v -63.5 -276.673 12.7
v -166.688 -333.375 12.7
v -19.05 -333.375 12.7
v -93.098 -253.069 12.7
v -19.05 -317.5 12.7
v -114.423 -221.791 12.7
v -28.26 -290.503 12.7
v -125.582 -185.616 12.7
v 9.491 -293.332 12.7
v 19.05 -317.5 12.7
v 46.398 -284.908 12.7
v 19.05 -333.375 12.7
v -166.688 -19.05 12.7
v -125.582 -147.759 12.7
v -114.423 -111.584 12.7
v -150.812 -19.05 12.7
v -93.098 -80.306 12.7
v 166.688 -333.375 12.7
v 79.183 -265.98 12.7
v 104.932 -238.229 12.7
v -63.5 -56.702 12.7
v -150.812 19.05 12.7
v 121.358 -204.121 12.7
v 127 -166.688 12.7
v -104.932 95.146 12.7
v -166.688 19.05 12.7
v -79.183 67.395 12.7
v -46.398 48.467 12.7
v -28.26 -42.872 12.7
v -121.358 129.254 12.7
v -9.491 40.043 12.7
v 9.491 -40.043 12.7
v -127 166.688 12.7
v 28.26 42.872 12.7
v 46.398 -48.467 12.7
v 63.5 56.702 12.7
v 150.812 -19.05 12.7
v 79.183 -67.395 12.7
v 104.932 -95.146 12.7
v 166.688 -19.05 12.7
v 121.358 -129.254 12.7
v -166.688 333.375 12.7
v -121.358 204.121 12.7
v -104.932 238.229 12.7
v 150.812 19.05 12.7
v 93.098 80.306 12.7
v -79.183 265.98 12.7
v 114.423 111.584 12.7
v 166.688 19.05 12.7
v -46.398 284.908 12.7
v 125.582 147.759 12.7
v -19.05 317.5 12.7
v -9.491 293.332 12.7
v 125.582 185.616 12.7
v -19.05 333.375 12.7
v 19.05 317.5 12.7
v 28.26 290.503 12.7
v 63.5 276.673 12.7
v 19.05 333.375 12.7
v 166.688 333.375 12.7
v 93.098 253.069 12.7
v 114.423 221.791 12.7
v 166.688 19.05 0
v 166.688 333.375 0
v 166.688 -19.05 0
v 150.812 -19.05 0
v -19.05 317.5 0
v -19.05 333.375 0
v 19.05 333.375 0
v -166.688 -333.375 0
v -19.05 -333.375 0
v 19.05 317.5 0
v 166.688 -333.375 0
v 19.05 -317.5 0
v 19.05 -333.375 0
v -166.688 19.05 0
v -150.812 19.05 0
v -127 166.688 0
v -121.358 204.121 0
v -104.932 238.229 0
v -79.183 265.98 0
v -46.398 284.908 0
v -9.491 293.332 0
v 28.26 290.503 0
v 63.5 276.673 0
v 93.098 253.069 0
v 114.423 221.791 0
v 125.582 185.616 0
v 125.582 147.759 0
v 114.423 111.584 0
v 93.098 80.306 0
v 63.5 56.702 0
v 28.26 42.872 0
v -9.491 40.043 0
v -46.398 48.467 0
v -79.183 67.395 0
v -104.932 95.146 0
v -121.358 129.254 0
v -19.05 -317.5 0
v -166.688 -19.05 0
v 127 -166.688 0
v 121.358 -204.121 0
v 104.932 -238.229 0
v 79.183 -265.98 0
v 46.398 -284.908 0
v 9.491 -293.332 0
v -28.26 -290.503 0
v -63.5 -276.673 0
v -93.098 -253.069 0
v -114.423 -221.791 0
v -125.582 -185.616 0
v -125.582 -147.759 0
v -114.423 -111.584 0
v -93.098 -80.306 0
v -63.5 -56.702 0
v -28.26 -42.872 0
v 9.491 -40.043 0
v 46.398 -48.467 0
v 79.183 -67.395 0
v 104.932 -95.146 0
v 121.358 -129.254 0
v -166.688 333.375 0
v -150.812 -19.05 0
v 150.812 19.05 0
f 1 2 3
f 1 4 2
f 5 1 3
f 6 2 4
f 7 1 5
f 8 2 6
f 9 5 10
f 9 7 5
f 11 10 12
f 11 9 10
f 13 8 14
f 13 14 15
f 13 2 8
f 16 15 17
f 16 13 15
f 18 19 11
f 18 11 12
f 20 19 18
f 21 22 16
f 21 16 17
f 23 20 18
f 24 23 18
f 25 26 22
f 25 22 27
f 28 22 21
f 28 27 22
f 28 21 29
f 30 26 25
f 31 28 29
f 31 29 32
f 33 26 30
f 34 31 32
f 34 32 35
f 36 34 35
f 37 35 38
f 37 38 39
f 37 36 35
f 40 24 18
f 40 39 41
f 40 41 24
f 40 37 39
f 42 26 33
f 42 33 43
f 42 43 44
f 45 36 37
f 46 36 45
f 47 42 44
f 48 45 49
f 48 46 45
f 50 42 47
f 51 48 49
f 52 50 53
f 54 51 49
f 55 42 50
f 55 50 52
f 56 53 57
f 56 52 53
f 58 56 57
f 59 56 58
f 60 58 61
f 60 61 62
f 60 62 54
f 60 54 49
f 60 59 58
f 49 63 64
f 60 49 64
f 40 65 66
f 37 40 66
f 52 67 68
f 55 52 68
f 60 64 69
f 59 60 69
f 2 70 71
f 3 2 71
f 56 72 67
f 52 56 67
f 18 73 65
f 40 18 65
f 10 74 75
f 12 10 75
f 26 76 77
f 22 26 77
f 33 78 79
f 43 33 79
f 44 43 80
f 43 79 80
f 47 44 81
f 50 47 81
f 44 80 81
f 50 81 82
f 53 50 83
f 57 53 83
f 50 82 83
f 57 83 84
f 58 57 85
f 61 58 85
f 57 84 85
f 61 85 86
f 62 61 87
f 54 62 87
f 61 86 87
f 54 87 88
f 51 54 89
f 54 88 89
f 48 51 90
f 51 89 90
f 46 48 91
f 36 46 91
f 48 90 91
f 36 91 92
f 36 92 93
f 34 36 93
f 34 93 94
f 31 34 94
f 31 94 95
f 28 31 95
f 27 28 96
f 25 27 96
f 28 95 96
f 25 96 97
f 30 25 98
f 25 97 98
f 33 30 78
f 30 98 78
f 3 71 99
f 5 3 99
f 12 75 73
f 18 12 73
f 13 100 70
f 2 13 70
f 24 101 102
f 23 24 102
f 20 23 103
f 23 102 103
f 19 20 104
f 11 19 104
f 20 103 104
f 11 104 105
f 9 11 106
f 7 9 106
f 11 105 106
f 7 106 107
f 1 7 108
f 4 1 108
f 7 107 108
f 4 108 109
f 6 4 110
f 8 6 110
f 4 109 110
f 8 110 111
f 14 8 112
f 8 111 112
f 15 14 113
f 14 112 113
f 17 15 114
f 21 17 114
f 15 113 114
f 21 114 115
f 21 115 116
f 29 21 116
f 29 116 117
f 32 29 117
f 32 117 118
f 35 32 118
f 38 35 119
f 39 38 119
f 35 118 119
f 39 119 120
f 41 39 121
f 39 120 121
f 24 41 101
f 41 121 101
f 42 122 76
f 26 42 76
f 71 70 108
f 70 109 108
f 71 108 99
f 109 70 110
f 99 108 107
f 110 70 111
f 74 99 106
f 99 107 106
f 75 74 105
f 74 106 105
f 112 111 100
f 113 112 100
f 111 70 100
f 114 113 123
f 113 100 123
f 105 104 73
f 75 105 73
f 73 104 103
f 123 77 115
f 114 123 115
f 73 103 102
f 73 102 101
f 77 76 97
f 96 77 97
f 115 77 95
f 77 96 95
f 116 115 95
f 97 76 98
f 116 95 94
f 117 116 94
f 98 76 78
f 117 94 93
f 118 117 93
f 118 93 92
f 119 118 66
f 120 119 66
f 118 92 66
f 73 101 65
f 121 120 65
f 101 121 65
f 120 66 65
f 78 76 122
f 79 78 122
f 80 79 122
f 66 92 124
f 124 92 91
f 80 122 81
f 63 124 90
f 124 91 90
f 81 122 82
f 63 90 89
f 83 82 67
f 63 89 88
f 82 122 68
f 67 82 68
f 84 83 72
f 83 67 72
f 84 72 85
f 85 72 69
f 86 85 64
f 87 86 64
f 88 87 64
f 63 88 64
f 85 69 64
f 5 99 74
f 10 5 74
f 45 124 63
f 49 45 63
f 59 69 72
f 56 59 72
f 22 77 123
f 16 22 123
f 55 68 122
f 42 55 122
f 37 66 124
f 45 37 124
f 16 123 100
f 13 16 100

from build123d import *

# Parameters (mm, degrees)
F1_DEPTH = 12.7


with BuildPart() as f1:
    # F0 (on Top) → F1 (new body)
    with BuildSketch(Plane.XY):
        with BuildLine():
            Line((166.6875, -333.375), (166.6875, -166.6875))
            Line((166.6875, -166.6875), (127, -166.6875))
            ThreePointArc((127, -166.6875), (0, -293.6875), (-127, -166.6875))
            Line((-127, -166.6875), (-166.6875, -166.6875))
            Line((-166.6875, -166.6875), (-166.6875, -333.375))
            Line((-166.6875, -333.375), (-19.05, -333.375))
            Line((-19.05, -333.375), (-19.05, -317.5))
            Line((-19.05, -317.5), (19.05, -317.5))
            Line((19.05, -317.5), (19.05, -333.375))
            Line((19.05, -333.375), (166.6875, -333.375))
        make_face()
        with BuildLine():
            Line((127, 166.6875), (166.6875, 166.6875))
            Line((166.6875, 166.6875), (166.6875, 333.375))
            Line((166.6875, 333.375), (19.05, 333.375))
            Line((19.05, 333.375), (19.05, 317.5))
            Line((19.05, 317.5), (-19.05, 317.5))
            Line((-19.05, 317.5), (-19.05, 333.375))
            Line((-19.05, 333.375), (-166.6875, 333.375))
            Line((-166.6875, 333.375), (-166.6875, 166.6875))
            Line((-166.6875, 166.6875), (-127, 166.6875))
            ThreePointArc((-127, 166.6875), (0, 293.6875), (127, 166.6875))
        make_face()
        with BuildLine():
            Line((127, -166.6875), (166.6875, -166.6875))
            Line((166.6875, -166.6875), (166.6875, -19.05))
            Line((166.6875, -19.05), (150.8125, -19.05))
            Line((150.8125, -19.05), (150.8125, 19.05))
            Line((150.8125, 19.05), (166.6875, 19.05))
            Line((166.6875, 19.05), (166.6875, 166.6875))
            Line((166.6875, 166.6875), (127, 166.6875))
            ThreePointArc((127, 166.6875), (0, 39.6875), (-127, 166.6875))
            Line((-127, 166.6875), (-166.6875, 166.6875))
            Line((-166.6875, 166.6875), (-166.6875, 19.05))
            Line((-166.6875, 19.05), (-150.8125, 19.05))
            Line((-150.8125, 19.05), (-150.8125, -19.05))
            Line((-150.8125, -19.05), (-166.6875, -19.05))
            Line((-166.6875, -19.05), (-166.6875, -166.6875))
            Line((-166.6875, -166.6875), (-127, -166.6875))
            ThreePointArc((-127, -166.6875), (0, -39.6875), (127, -166.6875))
        make_face()
    extrude(amount=F1_DEPTH)


solid = f1.part
